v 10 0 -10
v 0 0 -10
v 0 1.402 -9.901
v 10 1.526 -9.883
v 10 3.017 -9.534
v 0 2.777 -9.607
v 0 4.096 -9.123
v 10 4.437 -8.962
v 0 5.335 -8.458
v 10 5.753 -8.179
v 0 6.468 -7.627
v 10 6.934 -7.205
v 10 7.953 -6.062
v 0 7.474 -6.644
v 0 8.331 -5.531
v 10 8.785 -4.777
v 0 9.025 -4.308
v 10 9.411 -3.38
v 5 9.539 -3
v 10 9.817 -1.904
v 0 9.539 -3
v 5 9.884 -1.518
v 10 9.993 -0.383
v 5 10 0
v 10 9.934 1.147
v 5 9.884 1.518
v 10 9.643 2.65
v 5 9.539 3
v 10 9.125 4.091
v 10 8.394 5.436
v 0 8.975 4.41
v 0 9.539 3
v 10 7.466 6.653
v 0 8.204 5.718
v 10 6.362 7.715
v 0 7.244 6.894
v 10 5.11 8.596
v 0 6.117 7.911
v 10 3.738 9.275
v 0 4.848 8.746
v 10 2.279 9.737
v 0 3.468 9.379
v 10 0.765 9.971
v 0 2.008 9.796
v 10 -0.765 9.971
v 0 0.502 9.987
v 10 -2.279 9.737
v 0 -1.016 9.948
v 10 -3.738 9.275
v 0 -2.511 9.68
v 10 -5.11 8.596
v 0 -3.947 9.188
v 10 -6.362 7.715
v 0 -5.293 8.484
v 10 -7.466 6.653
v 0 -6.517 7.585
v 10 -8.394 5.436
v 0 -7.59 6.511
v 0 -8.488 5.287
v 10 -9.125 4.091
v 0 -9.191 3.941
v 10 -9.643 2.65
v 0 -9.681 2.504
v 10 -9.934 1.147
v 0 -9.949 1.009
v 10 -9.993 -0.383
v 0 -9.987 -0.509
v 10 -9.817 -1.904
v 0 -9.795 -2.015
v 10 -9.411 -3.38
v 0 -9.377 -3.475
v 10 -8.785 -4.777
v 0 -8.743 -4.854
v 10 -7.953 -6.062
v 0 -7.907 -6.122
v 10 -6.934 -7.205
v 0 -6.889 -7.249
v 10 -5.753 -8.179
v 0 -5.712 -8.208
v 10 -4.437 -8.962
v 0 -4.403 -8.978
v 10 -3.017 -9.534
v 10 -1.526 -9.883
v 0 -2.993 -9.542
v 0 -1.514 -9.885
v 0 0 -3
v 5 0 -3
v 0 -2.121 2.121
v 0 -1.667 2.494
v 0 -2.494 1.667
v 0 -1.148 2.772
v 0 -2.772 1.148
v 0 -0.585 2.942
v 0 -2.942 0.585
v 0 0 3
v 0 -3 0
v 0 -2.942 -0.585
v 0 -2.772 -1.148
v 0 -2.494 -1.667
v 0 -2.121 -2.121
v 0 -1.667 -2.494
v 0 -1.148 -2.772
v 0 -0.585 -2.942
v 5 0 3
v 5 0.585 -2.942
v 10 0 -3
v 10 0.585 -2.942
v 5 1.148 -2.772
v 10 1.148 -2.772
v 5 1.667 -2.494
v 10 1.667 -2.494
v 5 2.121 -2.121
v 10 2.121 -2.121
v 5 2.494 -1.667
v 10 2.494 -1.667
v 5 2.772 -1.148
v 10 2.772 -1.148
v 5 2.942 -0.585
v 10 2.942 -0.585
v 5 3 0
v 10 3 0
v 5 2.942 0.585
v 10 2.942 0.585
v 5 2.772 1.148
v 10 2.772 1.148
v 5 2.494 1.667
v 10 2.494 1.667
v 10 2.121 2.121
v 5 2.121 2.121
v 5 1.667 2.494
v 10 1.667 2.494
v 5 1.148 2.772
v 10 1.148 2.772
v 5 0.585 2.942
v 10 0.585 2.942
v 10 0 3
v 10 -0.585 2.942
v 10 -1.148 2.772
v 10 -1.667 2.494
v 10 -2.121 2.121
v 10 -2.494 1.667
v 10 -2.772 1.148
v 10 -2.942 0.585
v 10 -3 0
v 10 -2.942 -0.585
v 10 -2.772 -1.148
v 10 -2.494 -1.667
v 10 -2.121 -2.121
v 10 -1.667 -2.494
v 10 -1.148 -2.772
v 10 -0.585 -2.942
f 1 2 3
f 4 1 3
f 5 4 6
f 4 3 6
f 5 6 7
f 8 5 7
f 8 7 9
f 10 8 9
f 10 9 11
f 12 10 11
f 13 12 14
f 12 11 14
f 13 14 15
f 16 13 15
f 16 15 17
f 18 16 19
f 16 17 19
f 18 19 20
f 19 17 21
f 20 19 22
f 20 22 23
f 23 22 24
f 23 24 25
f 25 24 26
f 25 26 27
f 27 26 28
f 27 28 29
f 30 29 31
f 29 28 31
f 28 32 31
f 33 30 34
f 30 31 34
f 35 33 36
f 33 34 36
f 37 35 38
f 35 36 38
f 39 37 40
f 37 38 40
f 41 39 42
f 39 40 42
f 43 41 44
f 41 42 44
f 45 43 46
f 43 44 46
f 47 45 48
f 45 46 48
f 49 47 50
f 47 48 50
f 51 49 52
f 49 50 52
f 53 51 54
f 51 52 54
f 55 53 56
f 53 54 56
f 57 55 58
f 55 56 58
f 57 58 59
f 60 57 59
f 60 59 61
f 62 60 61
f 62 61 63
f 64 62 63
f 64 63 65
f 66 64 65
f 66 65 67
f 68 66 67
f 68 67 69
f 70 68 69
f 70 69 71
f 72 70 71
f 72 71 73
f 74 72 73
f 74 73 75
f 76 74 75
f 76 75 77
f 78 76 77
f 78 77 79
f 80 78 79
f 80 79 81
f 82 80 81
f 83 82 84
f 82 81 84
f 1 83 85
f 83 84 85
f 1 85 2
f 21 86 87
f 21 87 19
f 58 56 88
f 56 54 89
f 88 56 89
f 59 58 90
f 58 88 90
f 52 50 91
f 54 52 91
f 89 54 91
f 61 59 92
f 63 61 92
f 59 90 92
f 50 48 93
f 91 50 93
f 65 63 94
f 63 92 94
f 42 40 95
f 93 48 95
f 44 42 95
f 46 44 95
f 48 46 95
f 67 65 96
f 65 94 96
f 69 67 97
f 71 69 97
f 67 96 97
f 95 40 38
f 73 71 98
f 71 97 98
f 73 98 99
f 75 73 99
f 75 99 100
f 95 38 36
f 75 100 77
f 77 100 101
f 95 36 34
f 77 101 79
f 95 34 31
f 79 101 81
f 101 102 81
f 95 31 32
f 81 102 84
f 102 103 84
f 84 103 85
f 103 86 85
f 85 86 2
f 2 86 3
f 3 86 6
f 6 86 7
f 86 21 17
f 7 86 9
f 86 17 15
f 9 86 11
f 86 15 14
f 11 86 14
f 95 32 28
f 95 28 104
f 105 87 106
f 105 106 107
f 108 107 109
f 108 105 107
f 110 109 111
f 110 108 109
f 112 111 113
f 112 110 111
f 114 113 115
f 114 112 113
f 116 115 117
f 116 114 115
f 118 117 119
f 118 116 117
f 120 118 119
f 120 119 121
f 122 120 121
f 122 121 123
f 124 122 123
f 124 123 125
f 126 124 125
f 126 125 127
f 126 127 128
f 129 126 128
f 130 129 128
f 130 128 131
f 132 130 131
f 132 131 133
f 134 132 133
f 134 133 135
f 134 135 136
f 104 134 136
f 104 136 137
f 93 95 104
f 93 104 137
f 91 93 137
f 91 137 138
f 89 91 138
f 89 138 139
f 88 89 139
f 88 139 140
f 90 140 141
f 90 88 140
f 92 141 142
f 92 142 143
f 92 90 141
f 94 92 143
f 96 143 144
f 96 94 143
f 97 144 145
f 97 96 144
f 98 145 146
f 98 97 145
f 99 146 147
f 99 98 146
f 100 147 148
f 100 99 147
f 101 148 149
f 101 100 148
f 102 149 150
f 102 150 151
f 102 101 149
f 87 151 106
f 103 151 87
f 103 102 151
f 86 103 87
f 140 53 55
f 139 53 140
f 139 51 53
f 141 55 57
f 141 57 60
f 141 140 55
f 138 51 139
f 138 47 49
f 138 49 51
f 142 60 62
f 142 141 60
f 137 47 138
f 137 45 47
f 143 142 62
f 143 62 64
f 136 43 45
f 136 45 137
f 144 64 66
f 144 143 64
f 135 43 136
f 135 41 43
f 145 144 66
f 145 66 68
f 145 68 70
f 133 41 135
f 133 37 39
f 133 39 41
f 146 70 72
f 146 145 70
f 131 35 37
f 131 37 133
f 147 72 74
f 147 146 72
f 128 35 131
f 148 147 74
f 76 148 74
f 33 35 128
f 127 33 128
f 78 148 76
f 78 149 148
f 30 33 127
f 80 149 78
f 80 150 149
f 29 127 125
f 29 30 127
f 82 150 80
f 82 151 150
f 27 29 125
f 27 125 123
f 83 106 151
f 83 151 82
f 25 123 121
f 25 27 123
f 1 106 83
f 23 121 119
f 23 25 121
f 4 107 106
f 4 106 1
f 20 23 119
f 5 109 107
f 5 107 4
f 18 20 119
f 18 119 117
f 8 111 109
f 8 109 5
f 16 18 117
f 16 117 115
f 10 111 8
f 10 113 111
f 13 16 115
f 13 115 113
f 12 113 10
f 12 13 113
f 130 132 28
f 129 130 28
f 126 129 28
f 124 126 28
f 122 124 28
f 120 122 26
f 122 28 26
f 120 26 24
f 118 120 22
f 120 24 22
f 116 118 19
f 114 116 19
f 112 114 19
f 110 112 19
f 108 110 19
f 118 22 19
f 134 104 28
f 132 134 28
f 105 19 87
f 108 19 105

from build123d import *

# Parameters (mm, degrees)
SKETCH_1_R          = 10
SKETCH_1_R_2        = 3
EXTRUDE_1_DEPTH     = 10
CUT_EXTRUDE_1_DEPTH = 5


with BuildPart() as part:
    # ｽｹｯﾁ1 → ﾎﾞｽ - 押し出し1 (new body)
    with BuildSketch(Plane(origin=(0, 0, 0), x_dir=(0, 0, -1), z_dir=(1, 0, 0))):
        Circle(SKETCH_1_R)
        Circle(SKETCH_1_R_2, mode=Mode.SUBTRACT)
    extrude(amount=EXTRUDE_1_DEPTH)

    # ｽｹｯﾁ2 → ｶｯﾄ - 押し出し1 (cut)
    with BuildSketch(Plane.ZY):
        with BuildLine():
            Line((3, 10), (3, 0))
            ThreePointArc((3, 0), (0, -3), (-3, 0))
            Line((-3, 0), (-3, 10))
            ThreePointArc((-3, 10), (0, 13), (3, 10))
        make_face()
    extrude(amount=-CUT_EXTRUDE_1_DEPTH, mode=Mode.SUBTRACT)


solid = part.part
